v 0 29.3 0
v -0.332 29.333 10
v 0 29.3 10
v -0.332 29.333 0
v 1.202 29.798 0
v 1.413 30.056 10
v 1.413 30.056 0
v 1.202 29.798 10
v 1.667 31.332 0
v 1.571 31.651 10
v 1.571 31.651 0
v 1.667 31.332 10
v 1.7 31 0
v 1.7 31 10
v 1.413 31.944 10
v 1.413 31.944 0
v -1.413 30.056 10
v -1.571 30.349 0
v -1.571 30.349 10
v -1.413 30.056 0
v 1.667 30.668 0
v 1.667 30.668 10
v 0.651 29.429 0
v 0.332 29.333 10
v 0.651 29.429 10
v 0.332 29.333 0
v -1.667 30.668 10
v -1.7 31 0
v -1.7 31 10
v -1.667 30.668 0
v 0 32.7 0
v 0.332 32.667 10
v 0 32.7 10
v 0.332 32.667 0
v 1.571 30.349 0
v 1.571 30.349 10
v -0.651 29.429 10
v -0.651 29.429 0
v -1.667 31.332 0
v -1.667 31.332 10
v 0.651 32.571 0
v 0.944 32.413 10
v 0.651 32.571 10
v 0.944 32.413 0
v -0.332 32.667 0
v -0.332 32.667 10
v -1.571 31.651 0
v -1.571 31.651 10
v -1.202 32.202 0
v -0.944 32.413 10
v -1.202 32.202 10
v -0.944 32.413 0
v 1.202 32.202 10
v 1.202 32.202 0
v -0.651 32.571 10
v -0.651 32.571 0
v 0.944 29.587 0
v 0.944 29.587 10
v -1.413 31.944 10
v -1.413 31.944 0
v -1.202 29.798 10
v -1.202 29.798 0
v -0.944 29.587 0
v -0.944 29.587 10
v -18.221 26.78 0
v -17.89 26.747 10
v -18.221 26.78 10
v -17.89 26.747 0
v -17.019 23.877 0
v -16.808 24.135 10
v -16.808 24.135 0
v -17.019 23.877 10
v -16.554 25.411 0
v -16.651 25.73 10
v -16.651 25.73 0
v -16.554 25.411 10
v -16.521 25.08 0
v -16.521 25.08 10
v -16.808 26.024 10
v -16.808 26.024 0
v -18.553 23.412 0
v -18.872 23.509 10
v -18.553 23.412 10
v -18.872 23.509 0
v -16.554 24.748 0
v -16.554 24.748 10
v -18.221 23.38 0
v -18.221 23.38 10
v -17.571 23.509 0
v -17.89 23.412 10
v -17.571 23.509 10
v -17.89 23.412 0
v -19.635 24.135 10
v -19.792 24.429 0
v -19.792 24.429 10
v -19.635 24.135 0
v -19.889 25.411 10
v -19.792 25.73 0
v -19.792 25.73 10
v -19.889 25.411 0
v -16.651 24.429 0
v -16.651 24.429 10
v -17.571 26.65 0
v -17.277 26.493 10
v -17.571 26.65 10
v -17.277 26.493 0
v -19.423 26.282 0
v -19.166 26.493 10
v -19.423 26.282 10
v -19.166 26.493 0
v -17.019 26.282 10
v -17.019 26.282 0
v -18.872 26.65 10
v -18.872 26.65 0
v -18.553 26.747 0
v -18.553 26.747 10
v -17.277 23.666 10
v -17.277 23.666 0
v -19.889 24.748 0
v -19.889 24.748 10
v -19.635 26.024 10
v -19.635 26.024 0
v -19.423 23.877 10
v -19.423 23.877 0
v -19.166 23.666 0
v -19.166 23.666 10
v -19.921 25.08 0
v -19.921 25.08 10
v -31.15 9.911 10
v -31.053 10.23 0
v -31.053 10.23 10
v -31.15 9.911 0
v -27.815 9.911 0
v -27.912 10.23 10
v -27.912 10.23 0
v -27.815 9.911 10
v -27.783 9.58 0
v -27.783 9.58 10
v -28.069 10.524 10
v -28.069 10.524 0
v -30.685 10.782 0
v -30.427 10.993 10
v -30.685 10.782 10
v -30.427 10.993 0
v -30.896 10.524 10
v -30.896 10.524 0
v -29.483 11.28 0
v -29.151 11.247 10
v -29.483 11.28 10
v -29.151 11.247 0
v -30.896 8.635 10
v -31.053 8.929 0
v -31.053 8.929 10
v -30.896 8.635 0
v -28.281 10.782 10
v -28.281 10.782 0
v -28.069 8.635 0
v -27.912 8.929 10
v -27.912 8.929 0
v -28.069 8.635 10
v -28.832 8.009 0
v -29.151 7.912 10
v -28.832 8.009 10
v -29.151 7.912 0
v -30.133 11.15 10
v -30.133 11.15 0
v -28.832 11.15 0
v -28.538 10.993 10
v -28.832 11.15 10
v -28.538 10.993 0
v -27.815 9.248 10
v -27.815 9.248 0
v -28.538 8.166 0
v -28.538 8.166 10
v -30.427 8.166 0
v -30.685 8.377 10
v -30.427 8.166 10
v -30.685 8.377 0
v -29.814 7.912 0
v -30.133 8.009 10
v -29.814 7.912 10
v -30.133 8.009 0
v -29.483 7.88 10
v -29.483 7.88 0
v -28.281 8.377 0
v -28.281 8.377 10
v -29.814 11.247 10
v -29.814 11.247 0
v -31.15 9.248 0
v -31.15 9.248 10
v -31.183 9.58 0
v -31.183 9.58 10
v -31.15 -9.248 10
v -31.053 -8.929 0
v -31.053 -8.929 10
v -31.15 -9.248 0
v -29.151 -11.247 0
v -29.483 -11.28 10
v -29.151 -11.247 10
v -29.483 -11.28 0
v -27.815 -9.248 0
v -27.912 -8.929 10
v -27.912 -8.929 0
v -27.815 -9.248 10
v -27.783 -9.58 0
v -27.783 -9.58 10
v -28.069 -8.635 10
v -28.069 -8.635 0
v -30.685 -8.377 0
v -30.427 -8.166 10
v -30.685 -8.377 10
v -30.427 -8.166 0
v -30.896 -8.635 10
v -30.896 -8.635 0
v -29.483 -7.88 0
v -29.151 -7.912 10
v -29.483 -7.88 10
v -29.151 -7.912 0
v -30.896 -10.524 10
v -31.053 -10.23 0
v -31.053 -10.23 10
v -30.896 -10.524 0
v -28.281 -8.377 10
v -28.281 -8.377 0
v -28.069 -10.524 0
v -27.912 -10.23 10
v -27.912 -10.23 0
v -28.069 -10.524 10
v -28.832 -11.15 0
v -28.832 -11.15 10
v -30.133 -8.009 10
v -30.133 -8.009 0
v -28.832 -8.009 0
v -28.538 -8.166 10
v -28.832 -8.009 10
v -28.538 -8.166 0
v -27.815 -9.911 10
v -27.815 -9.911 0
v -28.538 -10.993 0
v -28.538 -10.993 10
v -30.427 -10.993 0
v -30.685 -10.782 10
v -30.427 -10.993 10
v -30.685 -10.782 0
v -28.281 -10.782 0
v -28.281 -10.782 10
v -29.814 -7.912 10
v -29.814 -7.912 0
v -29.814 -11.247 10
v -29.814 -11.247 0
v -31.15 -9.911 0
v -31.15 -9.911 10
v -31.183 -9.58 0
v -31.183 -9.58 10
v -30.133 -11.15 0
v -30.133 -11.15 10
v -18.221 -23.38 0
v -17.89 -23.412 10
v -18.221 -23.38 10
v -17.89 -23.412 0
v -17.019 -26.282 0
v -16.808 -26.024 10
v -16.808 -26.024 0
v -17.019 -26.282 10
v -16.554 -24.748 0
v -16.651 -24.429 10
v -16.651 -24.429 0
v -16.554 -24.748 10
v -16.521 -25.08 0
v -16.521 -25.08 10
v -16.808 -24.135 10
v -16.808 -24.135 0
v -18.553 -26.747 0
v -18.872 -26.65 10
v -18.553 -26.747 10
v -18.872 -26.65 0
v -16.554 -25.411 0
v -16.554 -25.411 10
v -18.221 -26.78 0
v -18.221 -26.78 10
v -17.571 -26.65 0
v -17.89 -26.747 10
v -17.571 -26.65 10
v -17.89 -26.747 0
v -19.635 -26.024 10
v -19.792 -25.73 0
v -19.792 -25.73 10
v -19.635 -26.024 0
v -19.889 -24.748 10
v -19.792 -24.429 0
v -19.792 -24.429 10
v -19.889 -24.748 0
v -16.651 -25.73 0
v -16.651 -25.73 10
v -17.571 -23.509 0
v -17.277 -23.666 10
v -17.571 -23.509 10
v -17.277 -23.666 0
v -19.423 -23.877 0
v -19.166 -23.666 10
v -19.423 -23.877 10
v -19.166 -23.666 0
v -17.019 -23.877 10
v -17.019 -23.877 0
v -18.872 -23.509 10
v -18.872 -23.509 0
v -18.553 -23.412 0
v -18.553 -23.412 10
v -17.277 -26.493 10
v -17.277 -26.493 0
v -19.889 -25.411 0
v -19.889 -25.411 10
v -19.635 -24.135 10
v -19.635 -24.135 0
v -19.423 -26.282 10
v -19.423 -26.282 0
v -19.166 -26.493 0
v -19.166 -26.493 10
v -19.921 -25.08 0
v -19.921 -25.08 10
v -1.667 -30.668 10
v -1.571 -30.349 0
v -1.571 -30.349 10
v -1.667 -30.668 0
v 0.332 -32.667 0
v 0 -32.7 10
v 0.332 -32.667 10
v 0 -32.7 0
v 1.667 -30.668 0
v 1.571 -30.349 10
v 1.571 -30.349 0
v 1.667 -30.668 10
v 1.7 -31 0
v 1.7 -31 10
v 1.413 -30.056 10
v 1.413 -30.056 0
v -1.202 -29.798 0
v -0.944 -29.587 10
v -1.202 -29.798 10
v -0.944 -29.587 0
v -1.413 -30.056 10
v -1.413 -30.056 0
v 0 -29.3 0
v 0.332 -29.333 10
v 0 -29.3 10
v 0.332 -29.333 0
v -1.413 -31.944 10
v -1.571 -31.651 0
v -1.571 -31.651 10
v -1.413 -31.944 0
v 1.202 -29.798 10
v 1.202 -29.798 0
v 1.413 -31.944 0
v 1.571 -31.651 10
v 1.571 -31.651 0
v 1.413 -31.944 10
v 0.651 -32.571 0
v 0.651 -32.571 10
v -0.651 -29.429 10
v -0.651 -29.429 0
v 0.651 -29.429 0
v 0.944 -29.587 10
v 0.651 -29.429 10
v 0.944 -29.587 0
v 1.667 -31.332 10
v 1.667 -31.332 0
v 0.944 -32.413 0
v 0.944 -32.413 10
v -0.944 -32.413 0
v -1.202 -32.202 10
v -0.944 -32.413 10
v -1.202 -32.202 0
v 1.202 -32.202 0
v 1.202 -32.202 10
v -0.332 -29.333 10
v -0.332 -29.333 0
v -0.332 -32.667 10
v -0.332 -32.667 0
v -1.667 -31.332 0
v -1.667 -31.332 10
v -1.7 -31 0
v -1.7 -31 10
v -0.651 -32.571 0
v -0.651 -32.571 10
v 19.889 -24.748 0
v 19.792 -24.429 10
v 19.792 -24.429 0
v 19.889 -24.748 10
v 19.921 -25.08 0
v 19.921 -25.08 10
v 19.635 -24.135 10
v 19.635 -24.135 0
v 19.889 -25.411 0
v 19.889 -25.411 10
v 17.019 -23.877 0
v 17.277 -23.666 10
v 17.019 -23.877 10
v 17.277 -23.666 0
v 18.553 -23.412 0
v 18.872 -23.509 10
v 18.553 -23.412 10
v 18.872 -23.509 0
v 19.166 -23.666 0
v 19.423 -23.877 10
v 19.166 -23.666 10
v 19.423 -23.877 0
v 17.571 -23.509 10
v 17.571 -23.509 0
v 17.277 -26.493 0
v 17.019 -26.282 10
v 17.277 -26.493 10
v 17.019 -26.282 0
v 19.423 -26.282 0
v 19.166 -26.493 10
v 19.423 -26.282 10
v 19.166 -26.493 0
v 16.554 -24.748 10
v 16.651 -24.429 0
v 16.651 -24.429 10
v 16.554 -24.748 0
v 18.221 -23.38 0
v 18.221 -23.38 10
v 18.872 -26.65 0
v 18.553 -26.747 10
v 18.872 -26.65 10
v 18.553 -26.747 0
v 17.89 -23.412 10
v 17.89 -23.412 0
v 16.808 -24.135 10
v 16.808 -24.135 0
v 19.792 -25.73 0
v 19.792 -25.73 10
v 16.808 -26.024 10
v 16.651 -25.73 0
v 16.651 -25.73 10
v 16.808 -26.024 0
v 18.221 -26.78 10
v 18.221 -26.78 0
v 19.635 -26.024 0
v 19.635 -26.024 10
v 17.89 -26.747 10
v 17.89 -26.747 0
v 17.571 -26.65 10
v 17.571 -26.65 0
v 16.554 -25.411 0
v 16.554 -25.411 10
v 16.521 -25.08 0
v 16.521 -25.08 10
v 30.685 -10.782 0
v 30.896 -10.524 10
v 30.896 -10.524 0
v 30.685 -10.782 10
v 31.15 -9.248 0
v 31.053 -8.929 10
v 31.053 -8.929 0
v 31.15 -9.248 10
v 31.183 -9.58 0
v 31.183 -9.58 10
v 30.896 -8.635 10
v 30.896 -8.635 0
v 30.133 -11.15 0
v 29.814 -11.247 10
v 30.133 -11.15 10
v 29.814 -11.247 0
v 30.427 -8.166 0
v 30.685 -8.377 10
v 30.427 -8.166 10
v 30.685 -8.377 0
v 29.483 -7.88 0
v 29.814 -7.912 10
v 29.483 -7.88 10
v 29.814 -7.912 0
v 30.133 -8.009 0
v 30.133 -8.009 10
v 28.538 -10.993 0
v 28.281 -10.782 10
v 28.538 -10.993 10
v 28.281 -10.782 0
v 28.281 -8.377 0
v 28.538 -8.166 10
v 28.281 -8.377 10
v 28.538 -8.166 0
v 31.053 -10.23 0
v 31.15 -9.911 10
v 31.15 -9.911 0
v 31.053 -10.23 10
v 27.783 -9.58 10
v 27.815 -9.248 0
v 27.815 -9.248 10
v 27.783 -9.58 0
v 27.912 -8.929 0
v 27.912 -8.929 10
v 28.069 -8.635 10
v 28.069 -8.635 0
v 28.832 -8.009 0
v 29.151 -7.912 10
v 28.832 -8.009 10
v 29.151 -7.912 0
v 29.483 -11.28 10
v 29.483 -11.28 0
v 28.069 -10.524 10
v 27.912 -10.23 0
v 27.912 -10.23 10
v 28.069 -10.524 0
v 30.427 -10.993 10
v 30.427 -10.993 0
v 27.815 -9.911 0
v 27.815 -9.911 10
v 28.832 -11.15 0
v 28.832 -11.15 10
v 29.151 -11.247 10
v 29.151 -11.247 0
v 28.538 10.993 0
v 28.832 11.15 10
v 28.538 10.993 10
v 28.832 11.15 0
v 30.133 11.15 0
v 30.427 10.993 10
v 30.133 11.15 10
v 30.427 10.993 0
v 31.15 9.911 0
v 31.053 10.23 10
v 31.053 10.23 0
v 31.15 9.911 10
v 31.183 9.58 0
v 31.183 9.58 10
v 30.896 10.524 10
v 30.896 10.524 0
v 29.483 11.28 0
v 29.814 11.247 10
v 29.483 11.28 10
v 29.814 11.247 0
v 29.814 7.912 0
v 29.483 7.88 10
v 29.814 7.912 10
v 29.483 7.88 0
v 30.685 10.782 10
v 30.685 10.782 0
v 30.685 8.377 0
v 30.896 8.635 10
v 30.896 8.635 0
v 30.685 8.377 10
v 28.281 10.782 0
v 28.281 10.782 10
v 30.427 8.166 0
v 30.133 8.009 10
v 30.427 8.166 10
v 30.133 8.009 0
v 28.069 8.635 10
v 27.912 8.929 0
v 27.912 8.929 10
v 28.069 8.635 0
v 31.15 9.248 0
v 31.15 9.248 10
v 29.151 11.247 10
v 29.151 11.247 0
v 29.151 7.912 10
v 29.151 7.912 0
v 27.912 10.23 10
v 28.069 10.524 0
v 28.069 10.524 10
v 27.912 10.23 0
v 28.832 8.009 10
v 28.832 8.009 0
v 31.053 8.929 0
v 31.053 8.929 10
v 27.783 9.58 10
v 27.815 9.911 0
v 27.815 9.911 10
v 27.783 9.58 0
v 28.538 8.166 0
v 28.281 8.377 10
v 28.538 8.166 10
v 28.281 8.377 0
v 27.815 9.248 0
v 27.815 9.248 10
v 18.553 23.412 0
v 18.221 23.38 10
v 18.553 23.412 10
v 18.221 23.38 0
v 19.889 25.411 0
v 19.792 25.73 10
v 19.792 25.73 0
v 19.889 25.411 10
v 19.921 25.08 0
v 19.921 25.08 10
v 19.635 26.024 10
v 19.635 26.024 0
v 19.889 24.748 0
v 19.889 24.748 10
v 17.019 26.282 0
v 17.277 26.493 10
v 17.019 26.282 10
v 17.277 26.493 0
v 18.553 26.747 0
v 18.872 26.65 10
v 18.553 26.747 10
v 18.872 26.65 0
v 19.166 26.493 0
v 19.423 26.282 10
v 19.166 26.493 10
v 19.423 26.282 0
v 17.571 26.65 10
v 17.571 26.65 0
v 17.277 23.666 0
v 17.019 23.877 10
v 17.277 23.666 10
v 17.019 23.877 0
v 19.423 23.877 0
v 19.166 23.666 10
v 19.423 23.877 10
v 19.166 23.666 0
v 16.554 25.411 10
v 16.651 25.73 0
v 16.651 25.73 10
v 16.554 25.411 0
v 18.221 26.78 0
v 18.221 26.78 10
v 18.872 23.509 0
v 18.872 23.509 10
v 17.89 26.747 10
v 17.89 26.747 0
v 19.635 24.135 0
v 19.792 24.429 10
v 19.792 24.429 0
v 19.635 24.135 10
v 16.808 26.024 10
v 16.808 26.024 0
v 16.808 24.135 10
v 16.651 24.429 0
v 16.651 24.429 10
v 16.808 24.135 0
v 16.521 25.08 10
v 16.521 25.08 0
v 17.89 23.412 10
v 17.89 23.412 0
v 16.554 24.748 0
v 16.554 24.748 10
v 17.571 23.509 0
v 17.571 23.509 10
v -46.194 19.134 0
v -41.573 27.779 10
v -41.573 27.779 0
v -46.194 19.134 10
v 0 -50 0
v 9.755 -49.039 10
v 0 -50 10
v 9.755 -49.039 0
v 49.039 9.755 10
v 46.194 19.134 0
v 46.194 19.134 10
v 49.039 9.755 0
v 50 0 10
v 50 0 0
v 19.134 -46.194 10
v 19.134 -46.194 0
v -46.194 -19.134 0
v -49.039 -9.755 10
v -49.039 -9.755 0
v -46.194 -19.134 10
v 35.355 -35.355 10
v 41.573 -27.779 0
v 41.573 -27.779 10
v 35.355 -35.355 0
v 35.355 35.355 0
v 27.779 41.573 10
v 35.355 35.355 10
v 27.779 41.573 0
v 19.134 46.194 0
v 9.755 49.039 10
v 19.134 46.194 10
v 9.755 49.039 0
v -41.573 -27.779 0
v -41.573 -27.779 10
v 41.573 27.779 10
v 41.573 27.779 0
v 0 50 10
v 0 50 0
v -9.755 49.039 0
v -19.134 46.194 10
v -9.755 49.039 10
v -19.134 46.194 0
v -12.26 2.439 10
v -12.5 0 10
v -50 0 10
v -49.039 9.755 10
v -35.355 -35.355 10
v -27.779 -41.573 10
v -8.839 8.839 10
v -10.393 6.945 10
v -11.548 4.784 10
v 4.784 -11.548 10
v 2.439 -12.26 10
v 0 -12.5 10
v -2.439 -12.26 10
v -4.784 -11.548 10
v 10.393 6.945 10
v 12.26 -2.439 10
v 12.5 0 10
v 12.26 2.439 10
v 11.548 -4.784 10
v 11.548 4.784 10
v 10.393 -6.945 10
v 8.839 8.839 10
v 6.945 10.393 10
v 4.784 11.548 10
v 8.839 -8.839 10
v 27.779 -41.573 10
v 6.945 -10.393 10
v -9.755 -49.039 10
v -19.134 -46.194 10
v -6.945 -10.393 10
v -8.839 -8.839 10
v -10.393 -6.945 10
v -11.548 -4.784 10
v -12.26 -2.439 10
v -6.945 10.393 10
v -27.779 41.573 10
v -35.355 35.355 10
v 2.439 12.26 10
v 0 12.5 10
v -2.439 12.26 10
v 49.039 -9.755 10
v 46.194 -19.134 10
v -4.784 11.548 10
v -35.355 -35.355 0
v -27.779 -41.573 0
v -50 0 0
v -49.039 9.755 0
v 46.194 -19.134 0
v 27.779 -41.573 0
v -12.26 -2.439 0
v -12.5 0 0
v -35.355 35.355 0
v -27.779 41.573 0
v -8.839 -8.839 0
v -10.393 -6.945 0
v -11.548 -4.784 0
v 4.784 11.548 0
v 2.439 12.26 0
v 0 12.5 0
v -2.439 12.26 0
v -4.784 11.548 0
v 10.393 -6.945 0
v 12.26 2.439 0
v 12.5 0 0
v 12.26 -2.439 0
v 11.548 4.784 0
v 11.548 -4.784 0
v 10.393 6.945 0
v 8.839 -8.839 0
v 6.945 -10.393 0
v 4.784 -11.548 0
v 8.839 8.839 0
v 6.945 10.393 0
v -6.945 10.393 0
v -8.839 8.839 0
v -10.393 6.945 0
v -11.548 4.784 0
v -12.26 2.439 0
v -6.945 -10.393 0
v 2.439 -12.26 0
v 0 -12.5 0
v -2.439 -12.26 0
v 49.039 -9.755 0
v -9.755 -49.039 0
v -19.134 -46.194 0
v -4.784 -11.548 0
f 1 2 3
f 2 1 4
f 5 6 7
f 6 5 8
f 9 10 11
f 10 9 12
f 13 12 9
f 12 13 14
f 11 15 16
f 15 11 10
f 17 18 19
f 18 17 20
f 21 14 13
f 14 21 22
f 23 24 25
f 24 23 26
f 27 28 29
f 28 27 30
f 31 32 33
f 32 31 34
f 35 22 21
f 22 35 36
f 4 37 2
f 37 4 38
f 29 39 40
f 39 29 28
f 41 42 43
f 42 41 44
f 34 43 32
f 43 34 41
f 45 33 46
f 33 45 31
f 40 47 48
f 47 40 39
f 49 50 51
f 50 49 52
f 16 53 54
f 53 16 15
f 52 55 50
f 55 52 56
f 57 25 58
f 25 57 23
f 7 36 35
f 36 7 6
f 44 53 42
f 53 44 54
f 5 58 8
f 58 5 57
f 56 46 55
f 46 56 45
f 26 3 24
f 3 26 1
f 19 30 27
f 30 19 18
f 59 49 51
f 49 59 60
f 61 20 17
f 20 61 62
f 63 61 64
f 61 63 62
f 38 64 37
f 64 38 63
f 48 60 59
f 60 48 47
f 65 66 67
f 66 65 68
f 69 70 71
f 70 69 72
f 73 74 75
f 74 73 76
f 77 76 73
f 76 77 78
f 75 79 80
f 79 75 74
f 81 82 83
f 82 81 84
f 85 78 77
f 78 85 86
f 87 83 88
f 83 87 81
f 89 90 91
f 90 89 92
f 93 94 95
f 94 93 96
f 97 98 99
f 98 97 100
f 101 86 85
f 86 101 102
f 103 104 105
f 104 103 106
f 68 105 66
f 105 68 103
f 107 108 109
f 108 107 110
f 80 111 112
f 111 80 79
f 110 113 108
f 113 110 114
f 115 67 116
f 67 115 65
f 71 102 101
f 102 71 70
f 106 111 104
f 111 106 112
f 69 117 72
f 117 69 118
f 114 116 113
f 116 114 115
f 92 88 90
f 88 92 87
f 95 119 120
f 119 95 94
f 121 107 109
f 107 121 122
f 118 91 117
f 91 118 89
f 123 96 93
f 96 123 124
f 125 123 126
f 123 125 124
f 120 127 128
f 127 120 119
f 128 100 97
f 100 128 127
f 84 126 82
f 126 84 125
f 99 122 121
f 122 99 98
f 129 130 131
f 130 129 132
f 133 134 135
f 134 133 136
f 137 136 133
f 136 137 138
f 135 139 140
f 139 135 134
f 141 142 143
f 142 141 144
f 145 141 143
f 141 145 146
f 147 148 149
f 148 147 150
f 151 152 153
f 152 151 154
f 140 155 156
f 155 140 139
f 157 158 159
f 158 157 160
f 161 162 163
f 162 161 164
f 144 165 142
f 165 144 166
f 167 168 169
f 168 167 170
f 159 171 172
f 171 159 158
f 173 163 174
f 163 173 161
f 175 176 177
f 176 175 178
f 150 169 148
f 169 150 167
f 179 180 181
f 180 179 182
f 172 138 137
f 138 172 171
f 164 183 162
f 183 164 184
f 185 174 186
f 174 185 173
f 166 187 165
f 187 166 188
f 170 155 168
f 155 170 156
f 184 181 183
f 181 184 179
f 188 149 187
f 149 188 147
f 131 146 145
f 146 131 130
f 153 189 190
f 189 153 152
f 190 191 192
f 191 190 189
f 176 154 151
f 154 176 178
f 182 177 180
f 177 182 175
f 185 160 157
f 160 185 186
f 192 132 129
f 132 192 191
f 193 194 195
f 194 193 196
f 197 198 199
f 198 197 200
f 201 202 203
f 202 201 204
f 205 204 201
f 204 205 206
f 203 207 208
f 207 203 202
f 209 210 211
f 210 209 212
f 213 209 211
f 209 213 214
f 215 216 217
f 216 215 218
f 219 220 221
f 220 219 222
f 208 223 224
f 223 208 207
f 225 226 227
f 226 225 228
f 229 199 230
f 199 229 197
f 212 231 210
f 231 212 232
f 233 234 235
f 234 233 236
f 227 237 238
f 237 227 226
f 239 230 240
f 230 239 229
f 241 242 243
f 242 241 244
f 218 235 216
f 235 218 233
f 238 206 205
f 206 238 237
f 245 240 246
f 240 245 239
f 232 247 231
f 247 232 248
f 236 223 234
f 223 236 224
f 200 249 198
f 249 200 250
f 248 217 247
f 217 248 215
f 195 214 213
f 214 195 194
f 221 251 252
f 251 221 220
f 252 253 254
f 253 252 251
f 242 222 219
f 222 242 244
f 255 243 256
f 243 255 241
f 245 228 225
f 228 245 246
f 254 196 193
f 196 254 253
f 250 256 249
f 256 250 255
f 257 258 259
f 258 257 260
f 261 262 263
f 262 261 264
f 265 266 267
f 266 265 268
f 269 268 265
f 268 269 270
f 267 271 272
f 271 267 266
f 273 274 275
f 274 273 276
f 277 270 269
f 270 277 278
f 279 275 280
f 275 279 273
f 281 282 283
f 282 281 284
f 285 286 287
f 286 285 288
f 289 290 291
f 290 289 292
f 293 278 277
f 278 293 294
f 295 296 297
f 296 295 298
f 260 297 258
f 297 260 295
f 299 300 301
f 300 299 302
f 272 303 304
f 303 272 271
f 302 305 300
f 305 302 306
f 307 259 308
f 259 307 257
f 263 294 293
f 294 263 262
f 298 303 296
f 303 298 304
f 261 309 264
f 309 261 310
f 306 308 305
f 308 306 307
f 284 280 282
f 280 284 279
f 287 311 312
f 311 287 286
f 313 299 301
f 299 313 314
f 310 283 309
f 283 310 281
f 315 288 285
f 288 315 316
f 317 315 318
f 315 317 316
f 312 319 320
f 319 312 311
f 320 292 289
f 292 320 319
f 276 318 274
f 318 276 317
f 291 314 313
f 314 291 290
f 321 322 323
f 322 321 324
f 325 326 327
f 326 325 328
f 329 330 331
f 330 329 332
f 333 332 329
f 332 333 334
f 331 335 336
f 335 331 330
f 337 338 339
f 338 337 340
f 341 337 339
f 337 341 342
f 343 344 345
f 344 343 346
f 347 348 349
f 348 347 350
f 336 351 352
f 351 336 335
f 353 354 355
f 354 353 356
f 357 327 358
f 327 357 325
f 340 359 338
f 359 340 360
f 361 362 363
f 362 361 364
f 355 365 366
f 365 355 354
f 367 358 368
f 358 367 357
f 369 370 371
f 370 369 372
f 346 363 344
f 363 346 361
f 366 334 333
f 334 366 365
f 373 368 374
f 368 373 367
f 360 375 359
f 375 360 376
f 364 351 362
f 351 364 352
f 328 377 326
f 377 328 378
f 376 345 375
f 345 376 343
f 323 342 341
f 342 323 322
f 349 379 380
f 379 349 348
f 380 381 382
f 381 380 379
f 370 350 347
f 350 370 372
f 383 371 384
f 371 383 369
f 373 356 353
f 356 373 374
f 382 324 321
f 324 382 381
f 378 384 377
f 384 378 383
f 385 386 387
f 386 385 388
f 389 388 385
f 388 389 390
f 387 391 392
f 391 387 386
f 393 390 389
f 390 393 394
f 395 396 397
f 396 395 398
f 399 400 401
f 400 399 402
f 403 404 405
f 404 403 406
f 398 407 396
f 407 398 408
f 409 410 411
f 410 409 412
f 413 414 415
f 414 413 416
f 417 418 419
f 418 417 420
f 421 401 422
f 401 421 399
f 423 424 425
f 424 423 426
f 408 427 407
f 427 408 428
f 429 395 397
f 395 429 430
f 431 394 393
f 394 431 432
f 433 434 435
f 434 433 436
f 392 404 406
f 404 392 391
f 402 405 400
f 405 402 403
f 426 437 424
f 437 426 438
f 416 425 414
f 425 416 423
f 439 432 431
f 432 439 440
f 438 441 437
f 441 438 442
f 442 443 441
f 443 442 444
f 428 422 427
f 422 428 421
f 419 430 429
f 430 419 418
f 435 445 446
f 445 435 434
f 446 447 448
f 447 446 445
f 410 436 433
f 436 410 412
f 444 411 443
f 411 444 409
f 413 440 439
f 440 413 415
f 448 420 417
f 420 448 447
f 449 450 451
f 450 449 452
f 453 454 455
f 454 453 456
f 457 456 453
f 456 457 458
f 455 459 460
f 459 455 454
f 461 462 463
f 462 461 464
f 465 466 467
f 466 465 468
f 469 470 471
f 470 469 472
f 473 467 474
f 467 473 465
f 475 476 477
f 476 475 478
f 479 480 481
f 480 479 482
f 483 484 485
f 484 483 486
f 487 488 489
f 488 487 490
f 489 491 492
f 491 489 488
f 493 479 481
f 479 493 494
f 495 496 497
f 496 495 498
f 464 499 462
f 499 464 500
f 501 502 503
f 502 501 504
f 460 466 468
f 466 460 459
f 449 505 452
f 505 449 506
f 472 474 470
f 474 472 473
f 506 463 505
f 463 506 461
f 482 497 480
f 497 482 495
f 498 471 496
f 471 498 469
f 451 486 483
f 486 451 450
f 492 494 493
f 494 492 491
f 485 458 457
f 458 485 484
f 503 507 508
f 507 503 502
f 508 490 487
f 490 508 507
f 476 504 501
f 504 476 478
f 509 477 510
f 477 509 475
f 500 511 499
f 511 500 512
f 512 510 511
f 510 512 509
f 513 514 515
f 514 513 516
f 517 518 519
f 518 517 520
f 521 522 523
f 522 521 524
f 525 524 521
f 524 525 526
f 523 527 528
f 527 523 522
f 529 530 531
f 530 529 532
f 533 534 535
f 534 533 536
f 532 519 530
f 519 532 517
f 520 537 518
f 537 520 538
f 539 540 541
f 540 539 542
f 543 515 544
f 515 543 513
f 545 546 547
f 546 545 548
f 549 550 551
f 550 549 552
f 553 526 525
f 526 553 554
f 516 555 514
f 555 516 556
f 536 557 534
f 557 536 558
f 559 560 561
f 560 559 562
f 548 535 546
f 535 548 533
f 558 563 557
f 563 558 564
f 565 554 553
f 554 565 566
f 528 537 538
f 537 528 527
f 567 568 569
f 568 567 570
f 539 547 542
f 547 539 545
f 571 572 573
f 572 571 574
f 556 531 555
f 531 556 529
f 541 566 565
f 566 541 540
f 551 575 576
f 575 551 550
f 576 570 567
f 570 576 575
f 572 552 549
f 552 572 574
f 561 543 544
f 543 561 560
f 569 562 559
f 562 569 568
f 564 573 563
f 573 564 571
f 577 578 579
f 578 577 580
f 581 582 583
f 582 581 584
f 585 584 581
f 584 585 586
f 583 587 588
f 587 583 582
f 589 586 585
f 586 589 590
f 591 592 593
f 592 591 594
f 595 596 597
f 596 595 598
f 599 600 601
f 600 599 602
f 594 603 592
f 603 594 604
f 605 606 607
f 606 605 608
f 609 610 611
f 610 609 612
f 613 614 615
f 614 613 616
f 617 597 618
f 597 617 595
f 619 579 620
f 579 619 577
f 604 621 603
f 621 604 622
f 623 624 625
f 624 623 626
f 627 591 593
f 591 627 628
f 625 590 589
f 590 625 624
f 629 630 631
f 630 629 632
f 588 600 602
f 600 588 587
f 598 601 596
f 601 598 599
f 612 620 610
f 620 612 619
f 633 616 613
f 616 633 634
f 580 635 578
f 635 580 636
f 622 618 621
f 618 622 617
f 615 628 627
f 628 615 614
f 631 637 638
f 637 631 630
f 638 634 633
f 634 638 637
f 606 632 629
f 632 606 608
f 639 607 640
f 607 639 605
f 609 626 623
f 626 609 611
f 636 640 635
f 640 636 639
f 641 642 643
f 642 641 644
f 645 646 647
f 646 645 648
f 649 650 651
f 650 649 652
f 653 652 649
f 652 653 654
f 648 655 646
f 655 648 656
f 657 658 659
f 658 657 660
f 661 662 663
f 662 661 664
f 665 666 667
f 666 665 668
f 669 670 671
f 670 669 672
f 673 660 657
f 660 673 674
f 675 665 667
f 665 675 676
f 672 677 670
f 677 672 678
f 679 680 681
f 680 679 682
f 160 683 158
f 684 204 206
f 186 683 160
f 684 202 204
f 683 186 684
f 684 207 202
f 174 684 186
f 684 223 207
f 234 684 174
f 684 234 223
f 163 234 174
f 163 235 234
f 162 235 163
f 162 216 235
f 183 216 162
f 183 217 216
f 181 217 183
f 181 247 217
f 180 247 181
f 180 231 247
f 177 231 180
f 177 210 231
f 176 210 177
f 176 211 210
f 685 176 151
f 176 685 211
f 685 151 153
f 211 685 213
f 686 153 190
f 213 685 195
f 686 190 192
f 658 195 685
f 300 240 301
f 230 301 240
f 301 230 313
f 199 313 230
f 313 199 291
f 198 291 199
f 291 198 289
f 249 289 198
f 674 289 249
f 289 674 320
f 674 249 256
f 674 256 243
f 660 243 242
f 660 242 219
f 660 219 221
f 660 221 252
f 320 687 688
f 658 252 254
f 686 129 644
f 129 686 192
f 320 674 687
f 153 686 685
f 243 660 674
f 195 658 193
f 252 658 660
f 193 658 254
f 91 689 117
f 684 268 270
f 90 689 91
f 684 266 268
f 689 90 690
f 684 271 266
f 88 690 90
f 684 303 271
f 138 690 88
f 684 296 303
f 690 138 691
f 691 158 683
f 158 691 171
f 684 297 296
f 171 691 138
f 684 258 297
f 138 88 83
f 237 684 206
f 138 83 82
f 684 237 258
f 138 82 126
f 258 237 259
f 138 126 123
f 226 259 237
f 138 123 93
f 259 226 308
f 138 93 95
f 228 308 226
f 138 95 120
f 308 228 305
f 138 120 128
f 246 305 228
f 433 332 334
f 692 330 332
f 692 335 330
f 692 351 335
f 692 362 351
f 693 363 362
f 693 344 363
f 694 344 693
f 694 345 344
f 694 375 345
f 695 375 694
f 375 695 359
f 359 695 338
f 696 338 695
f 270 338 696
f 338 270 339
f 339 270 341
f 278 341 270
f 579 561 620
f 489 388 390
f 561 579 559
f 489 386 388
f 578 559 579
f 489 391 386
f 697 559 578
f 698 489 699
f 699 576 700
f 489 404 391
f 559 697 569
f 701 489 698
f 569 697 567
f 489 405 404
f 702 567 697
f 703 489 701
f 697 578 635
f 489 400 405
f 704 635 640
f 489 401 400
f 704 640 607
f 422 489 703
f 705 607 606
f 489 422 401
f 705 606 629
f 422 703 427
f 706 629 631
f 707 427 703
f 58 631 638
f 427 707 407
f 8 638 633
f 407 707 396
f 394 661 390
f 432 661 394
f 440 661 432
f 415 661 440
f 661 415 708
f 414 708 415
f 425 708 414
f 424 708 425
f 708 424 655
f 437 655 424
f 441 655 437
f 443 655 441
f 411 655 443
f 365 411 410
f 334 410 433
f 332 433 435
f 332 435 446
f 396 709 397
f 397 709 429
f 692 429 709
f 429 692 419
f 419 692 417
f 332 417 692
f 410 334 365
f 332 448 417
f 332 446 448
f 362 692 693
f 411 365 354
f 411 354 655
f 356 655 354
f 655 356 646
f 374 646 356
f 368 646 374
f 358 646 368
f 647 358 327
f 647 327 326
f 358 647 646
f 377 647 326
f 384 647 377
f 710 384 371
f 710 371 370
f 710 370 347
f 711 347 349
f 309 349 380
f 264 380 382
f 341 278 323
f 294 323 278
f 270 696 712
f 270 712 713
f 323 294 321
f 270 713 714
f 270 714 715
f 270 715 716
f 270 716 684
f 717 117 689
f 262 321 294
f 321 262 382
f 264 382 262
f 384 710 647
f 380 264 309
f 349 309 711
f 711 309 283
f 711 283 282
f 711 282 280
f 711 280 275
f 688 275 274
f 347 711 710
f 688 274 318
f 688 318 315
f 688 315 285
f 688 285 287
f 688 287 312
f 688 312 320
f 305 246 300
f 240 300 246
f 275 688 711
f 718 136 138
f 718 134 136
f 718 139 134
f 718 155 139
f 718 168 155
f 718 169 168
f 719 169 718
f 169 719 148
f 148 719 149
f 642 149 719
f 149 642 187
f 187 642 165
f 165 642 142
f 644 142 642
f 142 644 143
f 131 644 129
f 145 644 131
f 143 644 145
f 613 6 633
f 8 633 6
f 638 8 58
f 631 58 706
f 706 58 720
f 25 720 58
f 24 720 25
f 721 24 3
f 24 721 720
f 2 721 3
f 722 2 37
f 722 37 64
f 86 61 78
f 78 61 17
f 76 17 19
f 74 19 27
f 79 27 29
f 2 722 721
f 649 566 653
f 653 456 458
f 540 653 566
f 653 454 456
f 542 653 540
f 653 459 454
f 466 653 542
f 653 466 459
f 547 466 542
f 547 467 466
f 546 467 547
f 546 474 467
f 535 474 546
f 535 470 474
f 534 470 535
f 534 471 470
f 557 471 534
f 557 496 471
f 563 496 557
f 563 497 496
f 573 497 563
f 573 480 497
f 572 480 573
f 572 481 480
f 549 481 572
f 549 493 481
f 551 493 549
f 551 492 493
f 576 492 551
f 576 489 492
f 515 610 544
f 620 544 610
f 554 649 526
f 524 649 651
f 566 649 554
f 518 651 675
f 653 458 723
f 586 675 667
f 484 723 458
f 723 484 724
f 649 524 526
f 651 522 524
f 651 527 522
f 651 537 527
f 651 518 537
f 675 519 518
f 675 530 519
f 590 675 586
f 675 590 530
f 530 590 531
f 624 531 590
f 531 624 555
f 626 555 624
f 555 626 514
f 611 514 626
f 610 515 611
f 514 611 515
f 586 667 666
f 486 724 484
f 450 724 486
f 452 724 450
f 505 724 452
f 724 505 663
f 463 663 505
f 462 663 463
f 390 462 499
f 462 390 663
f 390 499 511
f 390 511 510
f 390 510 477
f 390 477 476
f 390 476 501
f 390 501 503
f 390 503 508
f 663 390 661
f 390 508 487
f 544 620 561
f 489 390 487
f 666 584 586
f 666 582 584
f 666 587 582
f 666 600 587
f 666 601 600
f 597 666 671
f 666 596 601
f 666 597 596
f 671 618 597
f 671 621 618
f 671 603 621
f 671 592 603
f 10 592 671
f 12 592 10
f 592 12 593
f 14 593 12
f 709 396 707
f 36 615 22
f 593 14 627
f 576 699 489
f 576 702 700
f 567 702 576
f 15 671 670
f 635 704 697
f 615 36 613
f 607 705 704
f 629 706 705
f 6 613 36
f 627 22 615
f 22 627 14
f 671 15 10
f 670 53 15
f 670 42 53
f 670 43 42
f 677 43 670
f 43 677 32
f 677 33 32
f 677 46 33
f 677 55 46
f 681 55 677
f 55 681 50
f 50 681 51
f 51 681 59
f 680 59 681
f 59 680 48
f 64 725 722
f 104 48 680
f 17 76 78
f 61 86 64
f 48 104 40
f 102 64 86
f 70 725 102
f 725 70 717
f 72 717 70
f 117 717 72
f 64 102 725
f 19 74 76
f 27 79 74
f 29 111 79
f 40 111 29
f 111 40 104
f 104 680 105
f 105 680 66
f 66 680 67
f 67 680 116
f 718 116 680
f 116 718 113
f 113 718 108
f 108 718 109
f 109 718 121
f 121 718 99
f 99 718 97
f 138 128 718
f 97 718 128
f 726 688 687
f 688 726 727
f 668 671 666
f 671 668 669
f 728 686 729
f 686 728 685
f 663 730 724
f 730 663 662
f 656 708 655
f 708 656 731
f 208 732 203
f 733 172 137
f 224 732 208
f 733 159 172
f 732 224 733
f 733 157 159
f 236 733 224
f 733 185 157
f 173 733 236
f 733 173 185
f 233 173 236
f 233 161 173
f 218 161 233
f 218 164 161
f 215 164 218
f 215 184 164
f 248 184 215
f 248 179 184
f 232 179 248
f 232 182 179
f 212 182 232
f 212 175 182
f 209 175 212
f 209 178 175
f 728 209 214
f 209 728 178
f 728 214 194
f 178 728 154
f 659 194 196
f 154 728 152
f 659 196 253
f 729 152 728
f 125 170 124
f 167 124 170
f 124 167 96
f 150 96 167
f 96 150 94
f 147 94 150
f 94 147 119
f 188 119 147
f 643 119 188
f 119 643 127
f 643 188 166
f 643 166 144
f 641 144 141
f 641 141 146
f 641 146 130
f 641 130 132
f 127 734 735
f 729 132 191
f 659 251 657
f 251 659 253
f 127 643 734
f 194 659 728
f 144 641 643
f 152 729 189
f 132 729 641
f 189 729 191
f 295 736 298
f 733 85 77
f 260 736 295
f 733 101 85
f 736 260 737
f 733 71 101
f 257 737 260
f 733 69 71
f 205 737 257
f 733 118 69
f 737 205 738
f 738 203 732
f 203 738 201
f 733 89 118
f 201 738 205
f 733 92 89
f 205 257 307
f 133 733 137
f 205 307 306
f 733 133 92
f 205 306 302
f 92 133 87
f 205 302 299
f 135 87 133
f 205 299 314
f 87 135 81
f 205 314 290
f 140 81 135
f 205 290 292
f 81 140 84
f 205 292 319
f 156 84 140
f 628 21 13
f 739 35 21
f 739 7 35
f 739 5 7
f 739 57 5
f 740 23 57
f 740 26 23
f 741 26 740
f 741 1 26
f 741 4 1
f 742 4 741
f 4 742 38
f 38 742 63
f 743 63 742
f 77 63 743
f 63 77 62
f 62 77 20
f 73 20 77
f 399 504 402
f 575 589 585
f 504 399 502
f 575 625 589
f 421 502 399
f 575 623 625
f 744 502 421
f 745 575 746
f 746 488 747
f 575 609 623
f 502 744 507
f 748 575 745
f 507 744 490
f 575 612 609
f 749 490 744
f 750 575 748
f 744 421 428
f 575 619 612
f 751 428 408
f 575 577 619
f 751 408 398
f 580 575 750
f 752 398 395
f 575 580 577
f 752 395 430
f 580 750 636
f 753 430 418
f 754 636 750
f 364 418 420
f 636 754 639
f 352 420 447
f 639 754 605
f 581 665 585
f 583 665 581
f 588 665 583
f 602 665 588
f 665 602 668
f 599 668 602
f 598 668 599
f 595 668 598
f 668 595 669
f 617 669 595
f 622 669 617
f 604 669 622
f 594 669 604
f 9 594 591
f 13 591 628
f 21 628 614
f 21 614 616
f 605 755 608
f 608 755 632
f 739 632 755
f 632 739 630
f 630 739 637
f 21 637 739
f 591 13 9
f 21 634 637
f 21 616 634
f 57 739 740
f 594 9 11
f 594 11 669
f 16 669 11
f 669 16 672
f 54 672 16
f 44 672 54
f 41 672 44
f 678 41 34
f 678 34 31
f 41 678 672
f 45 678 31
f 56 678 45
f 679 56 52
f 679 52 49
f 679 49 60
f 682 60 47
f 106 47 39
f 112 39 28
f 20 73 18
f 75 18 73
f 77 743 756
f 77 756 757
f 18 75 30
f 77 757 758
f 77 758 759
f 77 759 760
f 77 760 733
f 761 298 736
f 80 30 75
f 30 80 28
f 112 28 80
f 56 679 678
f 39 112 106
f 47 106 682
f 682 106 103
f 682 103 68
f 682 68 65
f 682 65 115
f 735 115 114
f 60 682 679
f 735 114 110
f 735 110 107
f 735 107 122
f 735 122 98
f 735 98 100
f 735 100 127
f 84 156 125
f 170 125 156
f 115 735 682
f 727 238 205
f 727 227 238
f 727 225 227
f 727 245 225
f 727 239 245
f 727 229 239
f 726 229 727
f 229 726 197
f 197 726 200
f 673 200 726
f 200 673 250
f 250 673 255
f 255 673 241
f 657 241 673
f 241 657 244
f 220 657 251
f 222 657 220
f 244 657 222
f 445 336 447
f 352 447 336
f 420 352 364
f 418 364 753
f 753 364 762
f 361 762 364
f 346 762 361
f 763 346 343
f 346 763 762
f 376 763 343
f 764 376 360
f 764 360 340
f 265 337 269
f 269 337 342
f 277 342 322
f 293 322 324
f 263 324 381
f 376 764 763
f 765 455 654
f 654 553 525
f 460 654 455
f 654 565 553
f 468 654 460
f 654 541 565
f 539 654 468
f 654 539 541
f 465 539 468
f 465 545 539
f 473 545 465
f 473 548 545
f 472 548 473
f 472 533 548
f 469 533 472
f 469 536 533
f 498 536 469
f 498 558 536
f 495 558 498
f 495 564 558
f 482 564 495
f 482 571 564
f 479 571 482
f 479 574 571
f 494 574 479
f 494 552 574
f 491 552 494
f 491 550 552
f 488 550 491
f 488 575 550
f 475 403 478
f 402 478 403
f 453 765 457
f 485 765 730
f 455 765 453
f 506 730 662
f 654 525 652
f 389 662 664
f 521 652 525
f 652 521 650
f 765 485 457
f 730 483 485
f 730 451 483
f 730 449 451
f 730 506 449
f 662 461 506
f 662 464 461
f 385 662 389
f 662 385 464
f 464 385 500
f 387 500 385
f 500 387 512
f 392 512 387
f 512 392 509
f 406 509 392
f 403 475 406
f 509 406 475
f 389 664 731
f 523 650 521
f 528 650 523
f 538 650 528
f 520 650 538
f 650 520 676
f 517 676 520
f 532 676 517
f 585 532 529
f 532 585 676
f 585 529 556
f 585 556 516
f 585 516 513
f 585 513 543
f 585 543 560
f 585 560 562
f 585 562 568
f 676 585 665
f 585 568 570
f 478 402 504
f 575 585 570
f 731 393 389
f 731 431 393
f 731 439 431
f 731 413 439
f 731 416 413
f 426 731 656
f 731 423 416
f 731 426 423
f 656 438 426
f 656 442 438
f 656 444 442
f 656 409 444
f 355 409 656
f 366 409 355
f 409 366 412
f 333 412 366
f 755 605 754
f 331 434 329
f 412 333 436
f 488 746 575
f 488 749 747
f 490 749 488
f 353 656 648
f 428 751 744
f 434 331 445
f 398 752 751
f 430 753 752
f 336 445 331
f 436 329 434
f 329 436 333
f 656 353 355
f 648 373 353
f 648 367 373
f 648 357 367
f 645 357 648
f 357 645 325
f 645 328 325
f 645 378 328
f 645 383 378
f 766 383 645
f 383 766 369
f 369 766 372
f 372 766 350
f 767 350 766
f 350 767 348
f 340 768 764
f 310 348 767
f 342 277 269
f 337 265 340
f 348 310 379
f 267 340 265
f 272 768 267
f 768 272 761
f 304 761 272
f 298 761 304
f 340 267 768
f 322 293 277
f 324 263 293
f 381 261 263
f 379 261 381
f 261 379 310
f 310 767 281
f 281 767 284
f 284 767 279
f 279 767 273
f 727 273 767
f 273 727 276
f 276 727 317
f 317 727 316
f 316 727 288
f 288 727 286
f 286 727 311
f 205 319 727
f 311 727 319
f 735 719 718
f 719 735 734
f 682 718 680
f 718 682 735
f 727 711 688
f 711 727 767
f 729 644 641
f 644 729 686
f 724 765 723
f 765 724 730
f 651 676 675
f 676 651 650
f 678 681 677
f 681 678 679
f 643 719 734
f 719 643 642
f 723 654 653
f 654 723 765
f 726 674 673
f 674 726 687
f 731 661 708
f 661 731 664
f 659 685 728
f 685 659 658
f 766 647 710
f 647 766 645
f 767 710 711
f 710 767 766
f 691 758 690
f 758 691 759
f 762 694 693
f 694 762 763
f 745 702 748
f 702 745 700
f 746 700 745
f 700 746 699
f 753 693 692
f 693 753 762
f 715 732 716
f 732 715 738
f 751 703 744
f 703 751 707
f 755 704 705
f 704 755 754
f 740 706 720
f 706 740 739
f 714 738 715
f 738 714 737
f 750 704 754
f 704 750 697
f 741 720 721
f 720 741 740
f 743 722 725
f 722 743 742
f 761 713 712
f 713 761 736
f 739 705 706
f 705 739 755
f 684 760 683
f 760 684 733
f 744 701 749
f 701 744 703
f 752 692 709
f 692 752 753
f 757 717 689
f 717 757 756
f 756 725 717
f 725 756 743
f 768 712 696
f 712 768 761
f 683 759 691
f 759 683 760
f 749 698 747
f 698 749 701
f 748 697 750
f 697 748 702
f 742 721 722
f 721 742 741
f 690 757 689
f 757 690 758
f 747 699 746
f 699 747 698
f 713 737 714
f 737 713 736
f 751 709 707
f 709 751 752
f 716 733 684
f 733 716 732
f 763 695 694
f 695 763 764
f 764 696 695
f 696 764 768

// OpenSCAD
$fn = 32;

// ----------------------------------------------------------------------
// Flange Ø100 x 10
// 10 holes on a Ø62 bolt circle, bolted joints
// ----------------------------------------------------------------------

// --- parameters (mm) ---
flange_d = 100;  // outside diameter of the flange
thickness = 10;  // flange thickness
holes = 10;      // number of bolt holes
pcd = 62;        // bolt circle diameter
start_deg = 90;  // angle of the first hole, from +X
hole_d = 3.4;    // bolt hole diameter
bore_d = 25;     // central through bore
hub_d = 35;      // hub outside diameter
hub_h = 0;       // hub height above the flange face (0 = no hub)

// --- derived feature positions (mm) ---
height = thickness + hub_h;  // = 10   overall height of the part
pcd_r = pcd / 2;             // = 31   bolt circle radius
hole_step = 360 / holes;     // = 36   angular pitch
feature_centers = [
  [pcd_r * cos(start_deg + 0 * hole_step), pcd_r * sin(start_deg + 0 * hole_step)],
  [pcd_r * cos(start_deg + 1 * hole_step), pcd_r * sin(start_deg + 1 * hole_step)],
  [pcd_r * cos(start_deg + 2 * hole_step), pcd_r * sin(start_deg + 2 * hole_step)],
  [pcd_r * cos(start_deg + 3 * hole_step), pcd_r * sin(start_deg + 3 * hole_step)],
  [pcd_r * cos(start_deg + 4 * hole_step), pcd_r * sin(start_deg + 4 * hole_step)],
  [pcd_r * cos(start_deg + 5 * hole_step), pcd_r * sin(start_deg + 5 * hole_step)],
  [pcd_r * cos(start_deg + 6 * hole_step), pcd_r * sin(start_deg + 6 * hole_step)],
  [pcd_r * cos(start_deg + 7 * hole_step), pcd_r * sin(start_deg + 7 * hole_step)],
  [pcd_r * cos(start_deg + 8 * hole_step), pcd_r * sin(start_deg + 8 * hole_step)],
  [pcd_r * cos(start_deg + 9 * hole_step), pcd_r * sin(start_deg + 9 * hole_step)]
];   // bolt hole centres on the pitch circle

// flange disc, every hole and the bore cut straight through
difference() {
  union() {
    cylinder(d = flange_d, h = thickness);
  }
  translate([0, 0, -1]) cylinder(d = bore_d, h = height + 2);  // bore, through
  for (centre = feature_centers)
    translate([centre[0], centre[1], -1]) cylinder(d = hole_d, h = thickness + 2);
}
